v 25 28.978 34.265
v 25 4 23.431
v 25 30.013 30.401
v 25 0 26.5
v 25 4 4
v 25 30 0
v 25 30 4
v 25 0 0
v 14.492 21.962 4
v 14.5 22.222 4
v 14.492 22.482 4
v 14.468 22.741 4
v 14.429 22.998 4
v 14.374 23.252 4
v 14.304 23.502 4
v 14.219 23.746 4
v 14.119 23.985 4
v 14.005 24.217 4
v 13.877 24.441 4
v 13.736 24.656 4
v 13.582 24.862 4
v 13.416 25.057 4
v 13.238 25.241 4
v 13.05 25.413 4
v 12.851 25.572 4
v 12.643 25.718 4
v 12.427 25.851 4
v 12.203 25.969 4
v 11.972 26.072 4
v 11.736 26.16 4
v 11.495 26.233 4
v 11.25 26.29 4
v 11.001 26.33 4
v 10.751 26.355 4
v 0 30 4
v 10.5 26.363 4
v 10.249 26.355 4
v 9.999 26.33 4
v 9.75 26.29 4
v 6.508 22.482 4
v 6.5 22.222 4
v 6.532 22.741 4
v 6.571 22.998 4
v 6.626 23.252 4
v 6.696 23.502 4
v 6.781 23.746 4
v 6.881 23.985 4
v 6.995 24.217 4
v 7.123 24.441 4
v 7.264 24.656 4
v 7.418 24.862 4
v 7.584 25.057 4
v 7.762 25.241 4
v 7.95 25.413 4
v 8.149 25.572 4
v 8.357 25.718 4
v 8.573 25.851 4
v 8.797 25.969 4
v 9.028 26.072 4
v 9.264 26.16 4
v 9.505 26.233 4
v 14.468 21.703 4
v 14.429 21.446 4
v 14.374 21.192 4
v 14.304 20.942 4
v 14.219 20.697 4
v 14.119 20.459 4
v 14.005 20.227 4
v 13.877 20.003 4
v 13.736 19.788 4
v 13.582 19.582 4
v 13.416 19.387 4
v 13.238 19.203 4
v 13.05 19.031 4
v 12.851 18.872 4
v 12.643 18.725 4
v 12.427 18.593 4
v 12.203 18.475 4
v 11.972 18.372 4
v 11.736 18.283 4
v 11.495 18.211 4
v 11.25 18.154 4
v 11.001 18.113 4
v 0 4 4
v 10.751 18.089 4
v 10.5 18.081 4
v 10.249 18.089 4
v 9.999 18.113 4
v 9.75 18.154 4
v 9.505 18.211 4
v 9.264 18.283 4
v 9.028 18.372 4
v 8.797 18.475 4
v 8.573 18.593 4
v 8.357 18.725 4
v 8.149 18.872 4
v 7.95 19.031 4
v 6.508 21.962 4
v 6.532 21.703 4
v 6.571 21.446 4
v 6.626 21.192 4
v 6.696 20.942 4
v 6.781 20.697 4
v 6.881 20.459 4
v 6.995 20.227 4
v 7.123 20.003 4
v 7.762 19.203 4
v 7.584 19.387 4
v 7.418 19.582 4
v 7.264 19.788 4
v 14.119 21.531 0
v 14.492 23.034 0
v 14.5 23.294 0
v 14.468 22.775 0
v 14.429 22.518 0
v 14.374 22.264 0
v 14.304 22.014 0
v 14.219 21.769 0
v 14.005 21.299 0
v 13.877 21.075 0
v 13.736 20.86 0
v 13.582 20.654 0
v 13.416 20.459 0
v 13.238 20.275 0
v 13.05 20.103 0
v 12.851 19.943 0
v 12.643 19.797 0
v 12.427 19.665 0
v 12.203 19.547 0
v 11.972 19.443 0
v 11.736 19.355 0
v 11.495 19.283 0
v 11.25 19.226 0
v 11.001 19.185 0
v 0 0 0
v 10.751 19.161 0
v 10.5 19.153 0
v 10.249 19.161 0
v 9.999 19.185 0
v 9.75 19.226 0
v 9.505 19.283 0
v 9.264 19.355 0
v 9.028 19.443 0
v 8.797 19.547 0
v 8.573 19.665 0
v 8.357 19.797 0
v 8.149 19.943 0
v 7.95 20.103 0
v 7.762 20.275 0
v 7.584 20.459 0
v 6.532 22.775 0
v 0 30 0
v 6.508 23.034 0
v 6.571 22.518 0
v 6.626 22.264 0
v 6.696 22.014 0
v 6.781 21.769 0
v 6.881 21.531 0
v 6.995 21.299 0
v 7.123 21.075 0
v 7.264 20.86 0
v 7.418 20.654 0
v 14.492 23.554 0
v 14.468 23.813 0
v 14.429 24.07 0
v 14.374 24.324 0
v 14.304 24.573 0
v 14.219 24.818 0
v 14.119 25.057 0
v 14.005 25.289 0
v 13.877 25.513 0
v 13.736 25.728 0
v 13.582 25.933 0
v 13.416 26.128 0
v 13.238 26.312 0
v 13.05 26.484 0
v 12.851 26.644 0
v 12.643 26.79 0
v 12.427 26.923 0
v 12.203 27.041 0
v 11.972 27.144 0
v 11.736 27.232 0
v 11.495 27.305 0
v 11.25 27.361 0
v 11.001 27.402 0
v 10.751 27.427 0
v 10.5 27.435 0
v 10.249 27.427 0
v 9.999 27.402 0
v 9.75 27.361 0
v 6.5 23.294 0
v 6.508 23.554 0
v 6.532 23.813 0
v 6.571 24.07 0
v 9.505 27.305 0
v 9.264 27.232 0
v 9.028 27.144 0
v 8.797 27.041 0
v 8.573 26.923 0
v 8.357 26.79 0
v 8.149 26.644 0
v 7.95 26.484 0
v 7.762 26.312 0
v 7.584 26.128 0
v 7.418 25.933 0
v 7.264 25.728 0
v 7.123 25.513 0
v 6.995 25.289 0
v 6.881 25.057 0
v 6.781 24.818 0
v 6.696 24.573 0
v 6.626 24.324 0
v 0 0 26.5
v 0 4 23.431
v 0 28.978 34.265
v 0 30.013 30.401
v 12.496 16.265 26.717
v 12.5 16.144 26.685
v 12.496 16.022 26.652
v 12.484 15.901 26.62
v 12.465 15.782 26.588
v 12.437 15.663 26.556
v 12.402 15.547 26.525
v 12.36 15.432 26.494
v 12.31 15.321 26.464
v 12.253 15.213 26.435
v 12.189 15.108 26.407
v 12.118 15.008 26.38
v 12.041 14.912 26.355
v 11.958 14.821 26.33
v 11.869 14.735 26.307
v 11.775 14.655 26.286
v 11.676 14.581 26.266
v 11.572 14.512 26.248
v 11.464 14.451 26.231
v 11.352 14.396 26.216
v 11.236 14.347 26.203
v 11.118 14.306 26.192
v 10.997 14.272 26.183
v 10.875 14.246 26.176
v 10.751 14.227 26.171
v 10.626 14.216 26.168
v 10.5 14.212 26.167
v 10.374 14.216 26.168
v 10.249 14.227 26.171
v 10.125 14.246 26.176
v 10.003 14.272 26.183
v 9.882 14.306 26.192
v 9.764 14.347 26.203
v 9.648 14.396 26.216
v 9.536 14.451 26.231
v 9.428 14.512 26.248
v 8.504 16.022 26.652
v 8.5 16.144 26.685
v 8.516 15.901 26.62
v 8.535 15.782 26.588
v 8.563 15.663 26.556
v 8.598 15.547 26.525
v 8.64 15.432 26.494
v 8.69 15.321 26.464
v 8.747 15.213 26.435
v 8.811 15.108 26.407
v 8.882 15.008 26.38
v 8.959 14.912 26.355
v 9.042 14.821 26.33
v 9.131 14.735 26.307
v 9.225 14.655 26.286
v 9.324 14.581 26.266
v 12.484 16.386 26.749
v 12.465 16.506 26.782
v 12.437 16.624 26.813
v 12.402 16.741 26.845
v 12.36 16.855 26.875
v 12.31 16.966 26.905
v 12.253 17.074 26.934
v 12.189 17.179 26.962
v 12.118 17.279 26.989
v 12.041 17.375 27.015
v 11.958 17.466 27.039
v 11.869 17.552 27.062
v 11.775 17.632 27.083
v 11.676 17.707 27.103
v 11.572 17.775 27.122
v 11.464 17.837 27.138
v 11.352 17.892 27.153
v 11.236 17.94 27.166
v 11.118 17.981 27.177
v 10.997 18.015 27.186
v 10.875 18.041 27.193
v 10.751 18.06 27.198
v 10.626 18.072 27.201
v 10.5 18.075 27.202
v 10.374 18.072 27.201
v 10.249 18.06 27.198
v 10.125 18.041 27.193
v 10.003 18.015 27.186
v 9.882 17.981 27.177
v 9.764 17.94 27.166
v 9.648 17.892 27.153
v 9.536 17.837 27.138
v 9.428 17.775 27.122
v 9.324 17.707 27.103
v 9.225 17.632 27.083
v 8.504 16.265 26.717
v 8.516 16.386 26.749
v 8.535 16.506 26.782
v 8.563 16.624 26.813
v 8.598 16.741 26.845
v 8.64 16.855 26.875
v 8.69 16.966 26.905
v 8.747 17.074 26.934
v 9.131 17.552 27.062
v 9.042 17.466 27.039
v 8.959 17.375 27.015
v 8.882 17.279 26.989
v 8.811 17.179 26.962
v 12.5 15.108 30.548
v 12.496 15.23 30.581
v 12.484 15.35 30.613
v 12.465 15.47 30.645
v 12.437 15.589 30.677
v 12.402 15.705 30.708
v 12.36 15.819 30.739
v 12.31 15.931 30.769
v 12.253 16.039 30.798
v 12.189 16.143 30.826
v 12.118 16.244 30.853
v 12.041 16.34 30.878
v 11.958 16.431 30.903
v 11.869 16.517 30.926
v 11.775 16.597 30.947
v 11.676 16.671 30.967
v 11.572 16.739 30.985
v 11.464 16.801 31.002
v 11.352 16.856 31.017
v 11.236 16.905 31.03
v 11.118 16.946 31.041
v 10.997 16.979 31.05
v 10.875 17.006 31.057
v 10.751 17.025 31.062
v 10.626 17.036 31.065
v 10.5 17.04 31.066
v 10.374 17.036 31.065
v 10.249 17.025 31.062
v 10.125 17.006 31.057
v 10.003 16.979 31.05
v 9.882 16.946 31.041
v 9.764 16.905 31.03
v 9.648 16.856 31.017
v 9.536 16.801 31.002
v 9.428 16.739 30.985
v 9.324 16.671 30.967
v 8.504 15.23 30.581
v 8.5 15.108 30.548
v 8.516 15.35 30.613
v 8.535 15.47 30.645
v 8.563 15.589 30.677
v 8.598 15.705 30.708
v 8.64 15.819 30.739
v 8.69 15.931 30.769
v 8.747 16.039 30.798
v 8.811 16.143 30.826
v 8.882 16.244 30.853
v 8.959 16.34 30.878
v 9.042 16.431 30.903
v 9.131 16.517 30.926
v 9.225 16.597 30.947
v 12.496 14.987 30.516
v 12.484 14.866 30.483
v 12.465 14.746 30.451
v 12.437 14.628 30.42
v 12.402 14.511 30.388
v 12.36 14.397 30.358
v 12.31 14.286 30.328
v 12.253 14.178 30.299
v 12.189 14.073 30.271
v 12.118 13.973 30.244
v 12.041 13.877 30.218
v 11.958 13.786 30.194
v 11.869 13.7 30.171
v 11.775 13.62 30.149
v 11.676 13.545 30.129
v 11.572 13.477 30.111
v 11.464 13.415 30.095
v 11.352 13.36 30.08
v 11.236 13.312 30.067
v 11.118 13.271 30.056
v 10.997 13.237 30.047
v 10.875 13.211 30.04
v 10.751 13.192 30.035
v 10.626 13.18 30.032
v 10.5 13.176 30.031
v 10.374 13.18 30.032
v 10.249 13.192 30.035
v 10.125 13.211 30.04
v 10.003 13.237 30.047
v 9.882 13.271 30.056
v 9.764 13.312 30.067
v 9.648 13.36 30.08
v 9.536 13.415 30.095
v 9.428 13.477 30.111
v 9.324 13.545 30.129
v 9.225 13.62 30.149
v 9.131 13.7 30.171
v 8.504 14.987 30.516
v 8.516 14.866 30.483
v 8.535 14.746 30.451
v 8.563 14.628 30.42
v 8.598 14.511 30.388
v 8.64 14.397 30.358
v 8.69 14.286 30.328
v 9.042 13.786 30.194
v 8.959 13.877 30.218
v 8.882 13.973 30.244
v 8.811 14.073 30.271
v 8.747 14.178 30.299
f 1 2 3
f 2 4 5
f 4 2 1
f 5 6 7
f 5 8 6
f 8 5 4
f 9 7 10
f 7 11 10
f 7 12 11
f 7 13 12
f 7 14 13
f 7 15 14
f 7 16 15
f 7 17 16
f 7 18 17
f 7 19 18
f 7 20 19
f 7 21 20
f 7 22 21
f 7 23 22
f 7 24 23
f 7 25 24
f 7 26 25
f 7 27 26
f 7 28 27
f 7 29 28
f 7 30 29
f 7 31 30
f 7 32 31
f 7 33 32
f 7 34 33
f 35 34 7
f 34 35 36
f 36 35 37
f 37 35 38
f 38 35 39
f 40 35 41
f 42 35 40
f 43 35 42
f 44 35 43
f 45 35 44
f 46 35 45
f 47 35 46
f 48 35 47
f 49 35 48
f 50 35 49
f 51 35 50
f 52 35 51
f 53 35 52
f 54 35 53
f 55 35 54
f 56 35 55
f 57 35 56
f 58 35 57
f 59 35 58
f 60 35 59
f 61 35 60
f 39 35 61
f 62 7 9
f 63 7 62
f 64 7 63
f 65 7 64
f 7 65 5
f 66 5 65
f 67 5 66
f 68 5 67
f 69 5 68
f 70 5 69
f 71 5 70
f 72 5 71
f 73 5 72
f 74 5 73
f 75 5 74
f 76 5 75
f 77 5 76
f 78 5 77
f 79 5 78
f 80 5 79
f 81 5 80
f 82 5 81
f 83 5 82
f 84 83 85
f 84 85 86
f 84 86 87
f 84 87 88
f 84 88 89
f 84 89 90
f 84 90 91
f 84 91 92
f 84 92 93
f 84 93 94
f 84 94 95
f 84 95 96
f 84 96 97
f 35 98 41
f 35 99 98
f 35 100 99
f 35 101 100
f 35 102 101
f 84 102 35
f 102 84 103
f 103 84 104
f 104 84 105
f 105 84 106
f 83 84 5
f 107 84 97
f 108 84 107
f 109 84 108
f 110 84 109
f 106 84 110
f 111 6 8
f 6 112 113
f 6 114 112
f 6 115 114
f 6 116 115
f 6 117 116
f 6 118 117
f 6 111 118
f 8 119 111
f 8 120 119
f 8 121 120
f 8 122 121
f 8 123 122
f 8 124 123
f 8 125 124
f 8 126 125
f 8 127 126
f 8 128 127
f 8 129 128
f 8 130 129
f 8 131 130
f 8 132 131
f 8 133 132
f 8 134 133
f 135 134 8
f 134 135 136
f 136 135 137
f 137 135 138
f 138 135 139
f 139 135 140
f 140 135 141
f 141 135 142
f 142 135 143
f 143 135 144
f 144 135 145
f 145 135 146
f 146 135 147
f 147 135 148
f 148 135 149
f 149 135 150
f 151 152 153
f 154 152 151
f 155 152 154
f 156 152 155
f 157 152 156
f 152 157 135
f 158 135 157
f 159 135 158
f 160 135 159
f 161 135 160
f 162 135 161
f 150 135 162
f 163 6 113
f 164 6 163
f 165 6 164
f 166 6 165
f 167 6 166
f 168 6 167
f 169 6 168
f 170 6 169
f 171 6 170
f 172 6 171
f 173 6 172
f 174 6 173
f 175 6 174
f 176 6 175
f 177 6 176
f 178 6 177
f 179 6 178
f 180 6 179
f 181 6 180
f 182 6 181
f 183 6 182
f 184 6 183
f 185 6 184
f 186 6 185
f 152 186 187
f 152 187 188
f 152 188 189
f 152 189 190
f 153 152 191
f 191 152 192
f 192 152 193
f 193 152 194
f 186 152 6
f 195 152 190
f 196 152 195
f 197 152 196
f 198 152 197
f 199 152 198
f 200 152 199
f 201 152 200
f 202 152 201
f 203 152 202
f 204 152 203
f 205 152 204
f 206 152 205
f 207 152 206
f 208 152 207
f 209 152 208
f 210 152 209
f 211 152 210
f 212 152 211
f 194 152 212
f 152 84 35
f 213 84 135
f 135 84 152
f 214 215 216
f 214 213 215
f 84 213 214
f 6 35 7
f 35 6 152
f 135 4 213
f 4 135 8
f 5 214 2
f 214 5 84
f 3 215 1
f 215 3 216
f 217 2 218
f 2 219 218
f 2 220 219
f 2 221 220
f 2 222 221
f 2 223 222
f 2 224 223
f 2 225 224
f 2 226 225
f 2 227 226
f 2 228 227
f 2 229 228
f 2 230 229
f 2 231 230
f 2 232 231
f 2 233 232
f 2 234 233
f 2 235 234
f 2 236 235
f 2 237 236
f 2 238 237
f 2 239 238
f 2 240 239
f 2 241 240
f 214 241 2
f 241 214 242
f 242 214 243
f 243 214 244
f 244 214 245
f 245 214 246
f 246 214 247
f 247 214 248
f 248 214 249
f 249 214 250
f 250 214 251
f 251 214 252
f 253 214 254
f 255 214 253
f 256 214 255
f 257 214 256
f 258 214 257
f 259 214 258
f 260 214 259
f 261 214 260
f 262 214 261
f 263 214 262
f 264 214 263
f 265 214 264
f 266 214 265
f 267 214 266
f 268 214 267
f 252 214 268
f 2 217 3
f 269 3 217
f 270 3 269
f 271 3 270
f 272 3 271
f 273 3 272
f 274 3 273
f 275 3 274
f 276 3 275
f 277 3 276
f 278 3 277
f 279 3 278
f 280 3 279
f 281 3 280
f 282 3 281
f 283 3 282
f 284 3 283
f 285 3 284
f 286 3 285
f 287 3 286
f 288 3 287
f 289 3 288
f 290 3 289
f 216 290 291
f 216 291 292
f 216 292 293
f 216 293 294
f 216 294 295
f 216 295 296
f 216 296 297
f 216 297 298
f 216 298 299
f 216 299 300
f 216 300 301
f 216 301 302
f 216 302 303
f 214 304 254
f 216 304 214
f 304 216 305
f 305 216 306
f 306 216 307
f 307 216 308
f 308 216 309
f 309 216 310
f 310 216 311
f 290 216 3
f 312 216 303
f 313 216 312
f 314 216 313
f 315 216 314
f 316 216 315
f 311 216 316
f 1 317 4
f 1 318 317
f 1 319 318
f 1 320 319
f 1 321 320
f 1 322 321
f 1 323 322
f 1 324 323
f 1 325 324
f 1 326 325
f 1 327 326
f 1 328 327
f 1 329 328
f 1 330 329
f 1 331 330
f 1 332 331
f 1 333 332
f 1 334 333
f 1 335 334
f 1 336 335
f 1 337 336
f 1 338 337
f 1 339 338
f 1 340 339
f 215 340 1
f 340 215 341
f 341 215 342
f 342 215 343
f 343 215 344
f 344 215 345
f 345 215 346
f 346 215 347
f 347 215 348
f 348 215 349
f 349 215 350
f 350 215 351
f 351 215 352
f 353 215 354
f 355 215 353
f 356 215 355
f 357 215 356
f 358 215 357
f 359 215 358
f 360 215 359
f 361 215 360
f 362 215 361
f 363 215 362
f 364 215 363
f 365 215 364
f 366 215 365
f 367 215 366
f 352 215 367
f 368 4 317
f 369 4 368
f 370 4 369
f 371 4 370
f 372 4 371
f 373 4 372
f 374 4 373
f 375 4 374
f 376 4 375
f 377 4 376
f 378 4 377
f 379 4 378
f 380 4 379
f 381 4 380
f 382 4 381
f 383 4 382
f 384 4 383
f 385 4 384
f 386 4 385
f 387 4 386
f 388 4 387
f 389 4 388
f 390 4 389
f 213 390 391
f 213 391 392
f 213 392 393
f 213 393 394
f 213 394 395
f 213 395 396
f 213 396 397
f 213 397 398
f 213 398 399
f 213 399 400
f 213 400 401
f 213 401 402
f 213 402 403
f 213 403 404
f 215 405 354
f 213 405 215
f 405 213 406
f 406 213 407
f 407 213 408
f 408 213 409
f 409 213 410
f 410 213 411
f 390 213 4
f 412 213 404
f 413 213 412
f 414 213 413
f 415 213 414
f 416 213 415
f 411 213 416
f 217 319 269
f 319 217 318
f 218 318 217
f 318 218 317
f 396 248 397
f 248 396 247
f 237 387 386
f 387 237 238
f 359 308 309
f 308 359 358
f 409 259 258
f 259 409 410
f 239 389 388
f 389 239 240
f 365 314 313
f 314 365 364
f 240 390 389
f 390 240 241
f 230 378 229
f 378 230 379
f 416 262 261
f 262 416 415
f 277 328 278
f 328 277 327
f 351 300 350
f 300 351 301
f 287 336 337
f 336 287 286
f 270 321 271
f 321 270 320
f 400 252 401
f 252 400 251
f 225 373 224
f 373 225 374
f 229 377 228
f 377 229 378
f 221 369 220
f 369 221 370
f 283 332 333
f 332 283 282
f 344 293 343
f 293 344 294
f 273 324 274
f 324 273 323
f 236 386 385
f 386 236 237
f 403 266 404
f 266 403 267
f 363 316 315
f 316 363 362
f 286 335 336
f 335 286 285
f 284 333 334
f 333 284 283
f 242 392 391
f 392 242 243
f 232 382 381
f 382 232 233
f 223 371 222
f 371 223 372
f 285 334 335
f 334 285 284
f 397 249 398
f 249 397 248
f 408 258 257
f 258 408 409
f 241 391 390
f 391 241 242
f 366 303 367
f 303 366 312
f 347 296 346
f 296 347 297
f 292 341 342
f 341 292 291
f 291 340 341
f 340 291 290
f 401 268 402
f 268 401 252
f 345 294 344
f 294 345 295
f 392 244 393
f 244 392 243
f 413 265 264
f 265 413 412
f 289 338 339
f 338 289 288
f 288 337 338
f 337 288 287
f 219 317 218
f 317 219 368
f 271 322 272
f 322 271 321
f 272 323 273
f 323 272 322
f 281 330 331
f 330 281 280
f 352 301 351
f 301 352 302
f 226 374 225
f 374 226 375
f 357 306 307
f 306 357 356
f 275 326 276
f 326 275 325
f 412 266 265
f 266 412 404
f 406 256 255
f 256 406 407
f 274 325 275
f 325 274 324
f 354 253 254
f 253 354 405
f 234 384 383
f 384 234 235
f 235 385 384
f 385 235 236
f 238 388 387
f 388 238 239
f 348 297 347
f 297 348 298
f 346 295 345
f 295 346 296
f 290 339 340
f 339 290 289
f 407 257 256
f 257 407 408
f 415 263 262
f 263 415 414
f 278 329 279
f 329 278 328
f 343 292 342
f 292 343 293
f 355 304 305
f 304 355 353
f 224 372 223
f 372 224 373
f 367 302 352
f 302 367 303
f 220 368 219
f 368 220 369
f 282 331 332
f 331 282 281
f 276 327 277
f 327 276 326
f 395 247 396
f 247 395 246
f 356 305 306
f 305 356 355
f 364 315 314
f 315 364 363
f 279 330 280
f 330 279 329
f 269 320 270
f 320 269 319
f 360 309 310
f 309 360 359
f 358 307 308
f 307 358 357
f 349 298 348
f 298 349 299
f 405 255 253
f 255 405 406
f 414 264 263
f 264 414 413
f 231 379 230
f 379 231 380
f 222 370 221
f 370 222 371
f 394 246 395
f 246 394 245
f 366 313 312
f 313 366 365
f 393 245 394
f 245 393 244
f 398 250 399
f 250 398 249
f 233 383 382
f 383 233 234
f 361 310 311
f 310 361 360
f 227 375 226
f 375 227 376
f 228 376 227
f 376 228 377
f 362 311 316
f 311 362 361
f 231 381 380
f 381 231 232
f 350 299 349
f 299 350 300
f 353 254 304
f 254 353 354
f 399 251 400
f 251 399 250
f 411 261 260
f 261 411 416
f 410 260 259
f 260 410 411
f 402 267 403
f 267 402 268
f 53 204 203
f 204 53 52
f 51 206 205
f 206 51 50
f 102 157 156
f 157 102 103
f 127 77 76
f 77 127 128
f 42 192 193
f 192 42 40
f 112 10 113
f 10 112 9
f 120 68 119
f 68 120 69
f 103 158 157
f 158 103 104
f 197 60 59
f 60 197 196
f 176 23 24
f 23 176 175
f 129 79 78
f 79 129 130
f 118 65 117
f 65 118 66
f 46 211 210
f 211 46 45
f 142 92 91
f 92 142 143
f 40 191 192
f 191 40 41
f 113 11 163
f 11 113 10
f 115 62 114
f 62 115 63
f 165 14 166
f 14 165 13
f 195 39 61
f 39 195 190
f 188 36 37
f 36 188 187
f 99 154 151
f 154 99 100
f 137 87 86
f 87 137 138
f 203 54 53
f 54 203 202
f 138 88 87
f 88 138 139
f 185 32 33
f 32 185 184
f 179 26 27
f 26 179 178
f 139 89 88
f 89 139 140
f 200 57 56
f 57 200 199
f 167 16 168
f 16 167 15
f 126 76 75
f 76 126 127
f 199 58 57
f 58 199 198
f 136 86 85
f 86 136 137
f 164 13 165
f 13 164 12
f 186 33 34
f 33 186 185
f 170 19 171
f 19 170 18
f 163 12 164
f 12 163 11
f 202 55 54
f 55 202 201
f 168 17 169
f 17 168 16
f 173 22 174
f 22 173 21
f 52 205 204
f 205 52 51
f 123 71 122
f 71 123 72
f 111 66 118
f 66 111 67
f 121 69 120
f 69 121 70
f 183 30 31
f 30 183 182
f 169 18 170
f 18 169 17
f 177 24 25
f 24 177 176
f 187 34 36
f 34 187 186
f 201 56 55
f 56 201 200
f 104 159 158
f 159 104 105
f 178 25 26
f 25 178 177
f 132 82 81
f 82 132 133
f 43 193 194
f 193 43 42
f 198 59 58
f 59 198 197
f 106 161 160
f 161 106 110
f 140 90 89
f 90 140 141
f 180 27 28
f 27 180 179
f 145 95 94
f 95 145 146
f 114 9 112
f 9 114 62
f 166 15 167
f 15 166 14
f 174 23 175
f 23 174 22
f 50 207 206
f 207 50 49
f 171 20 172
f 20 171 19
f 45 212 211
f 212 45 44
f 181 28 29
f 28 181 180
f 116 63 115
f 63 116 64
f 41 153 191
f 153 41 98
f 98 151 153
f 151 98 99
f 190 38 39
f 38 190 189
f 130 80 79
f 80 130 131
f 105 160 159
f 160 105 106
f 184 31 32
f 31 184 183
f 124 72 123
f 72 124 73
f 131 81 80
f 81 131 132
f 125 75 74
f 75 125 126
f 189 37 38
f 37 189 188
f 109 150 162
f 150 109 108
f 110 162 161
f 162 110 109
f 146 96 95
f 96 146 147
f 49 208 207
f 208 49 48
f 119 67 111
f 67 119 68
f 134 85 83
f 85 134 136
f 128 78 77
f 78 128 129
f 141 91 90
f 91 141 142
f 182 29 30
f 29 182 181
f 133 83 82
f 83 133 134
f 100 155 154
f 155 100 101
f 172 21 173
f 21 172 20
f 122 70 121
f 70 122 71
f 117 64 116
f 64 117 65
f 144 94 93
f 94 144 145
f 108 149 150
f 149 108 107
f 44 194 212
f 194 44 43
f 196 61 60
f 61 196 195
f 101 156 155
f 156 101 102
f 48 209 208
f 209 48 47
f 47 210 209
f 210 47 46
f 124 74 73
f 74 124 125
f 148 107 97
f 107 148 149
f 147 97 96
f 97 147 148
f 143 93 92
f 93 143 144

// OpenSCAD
 /*
 * Shelf holder
 * (c) 2020 David Mikulik
 * Licensed under 
 *   Creative Commons 
 *   Attribution Non Comercial Share alike license
 */
 
THIKNES=4;
WIDTH=25;
HEIGTH=30;
SHELF_THIKNES = 18.5;
BOLT_DIAMETER=4;
BOLT_COUNT = 1;
ANGLE=-75;

        difference () 
        {
        union () {
            cube([WIDTH,HEIGTH,THIKNES]);
            cube([WIDTH,THIKNES,SHELF_THIKNES+THIKNES*2]);
            translate ([0,0,SHELF_THIKNES+THIKNES*2]) {
               
                rotate([ANGLE,0,0])
                    cube([WIDTH,THIKNES,HEIGTH]);
                }
        }
            rotate([ANGLE,0,0]) {
            for (i = [1:BOLT_COUNT]) {
                X= (WIDTH-BOLT_DIAMETER)/(BOLT_COUNT+1)*i;
                echo (X);
                translate ([X,-SHELF_THIKNES/2,SHELF_THIKNES+THIKNES]) 
                    rotate([90,0,0])
                    bolt ();
                }
            }
        }
        
module bolt () {
 translate ([0,0,-THIKNES]) 
 cylinder (d=BOLT_DIAMETER, h=SHELF_THIKNES+2*THIKNES, $fn=100);
 translate ([0,0,-SHELF_THIKNES])
 cylinder (d=BOLT_DIAMETER*2, h=HEIGTH, $fn=100);
}
 
